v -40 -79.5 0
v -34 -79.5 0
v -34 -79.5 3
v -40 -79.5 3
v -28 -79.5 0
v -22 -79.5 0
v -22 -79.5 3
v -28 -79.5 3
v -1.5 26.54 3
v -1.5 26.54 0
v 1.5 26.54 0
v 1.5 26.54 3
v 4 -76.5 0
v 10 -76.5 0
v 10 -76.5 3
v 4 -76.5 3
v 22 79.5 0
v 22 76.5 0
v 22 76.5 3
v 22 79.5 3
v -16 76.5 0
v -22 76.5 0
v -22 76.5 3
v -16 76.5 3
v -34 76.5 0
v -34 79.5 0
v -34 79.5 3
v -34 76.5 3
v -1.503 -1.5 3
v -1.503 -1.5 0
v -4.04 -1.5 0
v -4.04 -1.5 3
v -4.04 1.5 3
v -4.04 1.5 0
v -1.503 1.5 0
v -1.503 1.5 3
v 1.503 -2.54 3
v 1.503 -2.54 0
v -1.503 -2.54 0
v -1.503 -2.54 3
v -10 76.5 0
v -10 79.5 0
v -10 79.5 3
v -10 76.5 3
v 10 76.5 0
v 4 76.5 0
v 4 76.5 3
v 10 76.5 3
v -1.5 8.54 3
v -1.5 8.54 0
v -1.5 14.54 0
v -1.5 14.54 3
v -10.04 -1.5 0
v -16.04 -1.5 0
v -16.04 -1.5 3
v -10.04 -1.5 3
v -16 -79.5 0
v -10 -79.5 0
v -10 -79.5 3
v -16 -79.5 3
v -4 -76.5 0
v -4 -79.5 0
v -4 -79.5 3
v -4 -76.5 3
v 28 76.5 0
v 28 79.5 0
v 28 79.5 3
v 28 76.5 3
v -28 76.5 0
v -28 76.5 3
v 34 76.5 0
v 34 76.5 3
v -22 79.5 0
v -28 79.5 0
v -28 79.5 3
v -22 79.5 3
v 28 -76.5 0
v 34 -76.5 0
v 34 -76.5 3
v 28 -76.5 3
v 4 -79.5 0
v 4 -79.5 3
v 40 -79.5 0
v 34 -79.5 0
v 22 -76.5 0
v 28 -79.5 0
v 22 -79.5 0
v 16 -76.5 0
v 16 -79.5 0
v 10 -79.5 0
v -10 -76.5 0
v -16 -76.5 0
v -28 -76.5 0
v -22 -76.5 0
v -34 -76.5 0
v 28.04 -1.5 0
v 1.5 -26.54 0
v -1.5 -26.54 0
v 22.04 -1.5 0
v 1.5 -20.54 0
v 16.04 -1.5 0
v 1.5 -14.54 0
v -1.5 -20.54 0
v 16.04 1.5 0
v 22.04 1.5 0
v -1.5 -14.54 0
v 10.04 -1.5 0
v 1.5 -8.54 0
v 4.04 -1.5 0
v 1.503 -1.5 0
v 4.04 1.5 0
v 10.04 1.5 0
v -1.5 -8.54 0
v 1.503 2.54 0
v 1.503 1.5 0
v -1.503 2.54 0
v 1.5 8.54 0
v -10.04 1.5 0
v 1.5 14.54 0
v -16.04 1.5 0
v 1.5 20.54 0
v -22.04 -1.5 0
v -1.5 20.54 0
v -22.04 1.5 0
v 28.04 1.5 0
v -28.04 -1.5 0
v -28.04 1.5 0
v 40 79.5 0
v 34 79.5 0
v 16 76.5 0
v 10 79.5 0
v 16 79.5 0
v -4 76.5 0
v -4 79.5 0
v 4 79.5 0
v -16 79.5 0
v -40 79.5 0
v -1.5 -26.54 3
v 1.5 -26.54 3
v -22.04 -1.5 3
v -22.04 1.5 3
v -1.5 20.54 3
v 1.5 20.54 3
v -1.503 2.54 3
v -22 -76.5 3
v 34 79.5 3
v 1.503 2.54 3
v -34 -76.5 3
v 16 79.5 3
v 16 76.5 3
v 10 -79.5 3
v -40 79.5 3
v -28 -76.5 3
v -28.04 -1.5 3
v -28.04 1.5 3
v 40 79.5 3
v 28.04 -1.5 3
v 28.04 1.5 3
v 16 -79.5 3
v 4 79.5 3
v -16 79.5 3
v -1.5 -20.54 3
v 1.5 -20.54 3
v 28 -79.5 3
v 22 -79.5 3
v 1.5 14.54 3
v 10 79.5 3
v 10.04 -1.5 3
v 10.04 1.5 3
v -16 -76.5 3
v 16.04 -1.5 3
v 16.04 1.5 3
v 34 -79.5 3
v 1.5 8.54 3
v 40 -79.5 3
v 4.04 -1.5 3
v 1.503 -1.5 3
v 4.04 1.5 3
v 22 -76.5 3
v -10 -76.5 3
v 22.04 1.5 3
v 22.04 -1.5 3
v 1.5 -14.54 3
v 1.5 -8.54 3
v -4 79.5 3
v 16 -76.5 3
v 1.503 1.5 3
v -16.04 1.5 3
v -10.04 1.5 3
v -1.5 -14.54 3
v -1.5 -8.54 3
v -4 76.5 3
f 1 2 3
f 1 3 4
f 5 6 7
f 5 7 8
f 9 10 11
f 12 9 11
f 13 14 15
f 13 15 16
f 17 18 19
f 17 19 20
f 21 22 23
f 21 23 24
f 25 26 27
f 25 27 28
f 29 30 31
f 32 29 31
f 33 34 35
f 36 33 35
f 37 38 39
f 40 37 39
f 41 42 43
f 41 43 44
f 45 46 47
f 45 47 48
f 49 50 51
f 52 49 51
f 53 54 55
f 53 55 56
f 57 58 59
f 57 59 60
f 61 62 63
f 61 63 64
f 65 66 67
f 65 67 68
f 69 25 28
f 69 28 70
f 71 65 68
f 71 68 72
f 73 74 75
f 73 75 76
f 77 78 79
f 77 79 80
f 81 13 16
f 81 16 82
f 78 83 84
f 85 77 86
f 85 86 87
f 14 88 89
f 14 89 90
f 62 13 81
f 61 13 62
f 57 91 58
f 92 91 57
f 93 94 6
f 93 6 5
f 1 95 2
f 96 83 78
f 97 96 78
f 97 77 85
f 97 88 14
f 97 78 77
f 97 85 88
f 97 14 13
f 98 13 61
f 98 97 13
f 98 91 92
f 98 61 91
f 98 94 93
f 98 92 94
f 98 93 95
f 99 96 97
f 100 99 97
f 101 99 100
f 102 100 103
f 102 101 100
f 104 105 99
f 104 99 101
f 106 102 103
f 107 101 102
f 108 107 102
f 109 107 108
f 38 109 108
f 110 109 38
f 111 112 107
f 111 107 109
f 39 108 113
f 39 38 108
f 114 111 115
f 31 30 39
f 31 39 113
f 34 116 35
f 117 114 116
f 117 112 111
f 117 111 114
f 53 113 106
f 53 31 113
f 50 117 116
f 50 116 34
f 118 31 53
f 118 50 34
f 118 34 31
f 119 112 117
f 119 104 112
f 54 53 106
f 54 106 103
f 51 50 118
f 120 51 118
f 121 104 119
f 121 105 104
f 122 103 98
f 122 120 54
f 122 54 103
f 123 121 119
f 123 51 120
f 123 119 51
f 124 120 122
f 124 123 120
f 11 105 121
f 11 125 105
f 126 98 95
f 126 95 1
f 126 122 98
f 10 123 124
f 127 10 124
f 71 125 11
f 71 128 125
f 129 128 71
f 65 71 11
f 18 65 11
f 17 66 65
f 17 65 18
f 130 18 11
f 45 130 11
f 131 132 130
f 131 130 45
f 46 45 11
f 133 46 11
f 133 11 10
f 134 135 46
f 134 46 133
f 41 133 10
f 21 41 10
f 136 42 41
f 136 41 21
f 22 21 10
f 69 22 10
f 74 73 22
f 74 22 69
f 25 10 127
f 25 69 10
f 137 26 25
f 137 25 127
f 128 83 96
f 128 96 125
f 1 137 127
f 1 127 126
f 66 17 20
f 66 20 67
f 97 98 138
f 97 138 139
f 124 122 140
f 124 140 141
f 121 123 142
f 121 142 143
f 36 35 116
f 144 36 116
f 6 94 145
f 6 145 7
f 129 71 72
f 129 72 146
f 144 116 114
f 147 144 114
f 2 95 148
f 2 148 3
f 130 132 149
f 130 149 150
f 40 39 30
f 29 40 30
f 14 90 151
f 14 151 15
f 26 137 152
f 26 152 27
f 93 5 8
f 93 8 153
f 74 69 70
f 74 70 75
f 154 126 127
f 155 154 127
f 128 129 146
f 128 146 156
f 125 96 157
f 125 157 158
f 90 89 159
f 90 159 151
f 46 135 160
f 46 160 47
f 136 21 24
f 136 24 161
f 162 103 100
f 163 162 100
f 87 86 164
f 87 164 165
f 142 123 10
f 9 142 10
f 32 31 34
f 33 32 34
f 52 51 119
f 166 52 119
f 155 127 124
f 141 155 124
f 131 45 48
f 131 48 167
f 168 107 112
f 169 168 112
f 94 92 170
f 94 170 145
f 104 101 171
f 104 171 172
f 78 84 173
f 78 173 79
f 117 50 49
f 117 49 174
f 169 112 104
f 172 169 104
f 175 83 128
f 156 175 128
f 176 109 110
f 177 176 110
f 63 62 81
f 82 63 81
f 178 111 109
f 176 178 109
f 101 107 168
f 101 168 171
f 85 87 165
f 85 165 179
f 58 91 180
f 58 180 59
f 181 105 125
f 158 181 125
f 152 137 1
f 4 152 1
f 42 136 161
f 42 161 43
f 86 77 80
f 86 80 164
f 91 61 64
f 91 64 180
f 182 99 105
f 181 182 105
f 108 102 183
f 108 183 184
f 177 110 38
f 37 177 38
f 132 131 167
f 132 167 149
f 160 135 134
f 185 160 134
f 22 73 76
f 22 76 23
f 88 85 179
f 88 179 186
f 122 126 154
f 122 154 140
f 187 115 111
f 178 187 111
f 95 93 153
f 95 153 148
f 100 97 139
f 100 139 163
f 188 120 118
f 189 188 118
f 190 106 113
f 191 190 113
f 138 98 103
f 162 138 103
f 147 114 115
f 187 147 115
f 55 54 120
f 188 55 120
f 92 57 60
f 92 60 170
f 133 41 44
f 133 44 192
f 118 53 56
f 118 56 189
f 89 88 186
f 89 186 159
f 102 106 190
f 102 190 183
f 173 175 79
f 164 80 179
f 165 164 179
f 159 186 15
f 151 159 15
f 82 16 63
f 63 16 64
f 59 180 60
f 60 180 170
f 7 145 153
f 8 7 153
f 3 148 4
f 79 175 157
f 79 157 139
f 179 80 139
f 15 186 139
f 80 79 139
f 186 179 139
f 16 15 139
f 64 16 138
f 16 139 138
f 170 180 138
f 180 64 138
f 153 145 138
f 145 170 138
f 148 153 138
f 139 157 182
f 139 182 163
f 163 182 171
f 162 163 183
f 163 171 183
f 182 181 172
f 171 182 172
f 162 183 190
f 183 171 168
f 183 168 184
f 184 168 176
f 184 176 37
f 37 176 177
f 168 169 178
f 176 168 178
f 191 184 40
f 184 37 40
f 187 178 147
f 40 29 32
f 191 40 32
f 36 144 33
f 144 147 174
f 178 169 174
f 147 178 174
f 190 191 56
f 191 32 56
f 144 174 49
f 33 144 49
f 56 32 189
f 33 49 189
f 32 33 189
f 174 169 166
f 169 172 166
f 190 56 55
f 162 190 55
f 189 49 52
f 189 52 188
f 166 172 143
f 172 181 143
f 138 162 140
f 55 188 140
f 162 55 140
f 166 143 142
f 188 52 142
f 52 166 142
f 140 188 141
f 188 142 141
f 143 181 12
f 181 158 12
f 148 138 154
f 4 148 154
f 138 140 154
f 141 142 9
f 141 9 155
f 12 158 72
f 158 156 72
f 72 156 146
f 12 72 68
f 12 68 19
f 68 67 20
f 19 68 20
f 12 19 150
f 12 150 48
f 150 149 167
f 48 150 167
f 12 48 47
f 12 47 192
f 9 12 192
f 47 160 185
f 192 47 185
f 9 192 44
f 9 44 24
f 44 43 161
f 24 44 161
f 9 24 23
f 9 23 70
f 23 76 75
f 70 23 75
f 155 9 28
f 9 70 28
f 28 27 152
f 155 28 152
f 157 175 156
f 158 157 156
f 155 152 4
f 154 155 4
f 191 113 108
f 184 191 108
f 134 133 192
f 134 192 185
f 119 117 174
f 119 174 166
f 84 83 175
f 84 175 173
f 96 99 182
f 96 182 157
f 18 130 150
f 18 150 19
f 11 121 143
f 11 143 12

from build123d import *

# Parameters (mm, degrees)
SKETCH1_W           = 6
SKETCH1_H           = 3
SKETCH1_W_2         = 3
SKETCH1_H_2         = 6
BOSS_EXTRUDE1_DEPTH = 3


with BuildPart() as part:
    # Sketch1 → Boss-Extrude1 (new body)
    with BuildSketch(Plane.XY):
        Polygon((-34, 76.5), (-28, 76.5), (-28, 79.5), (-22, 79.5), (-22, 76.5), (-16, 76.5), (-16, 79.5), (-10, 79.5), (-10, 76.5), (-4, 76.5), (-4, 79.5), (0, 79.5), (4, 79.5), (4, 76.5), (10, 76.5), (10, 79.5), (16, 79.5), (16, 76.5), (22, 76.5), (22, 79.5), (28, 79.5), (28, 76.5), (34, 76.5), (34, 79.5), (40, 79.5), (40, 76.5), (40, -76.5), (40, -79.5), (34, -79.5), (34, -76.5), (28, -76.5), (28, -79.5), (22, -79.5), (22, -76.5), (16, -76.5), (16, -79.5), (10, -79.5), (10, -76.5), (4, -76.5), (4, -79.5), (0, -79.5), (-4, -79.5), (-4, -76.5), (-10, -76.5), (-10, -79.5), (-16, -79.5), (-16, -76.5), (-22, -76.5), (-22, -79.5), (-28, -79.5), (-28, -76.5), (-34, -76.5), (-34, -79.5), (-40, -79.5), (-40, -76.5), (-40, 76.5), (-40, 79.5), (-34, 79.5), align=None)
        Polygon((-1.503424482, 2.54), (1.503424482, 2.54), (1.503424482, 1.5), (4.04, 1.5), (4.04, -1.5), (1.503424482, -1.5), (1.503424482, -2.54), (-1.503424482, -2.54), (-1.503424482, -1.5), (-4.04, -1.5), (-4.04, 1.5), (-1.503424482, 1.5), align=None, mode=Mode.SUBTRACT)
        with Locations((25.04, 0)):
            Rectangle(SKETCH1_W, SKETCH1_H, mode=Mode.SUBTRACT)
        with Locations((-13.04, 0)):
            Rectangle(SKETCH1_W, SKETCH1_H, mode=Mode.SUBTRACT)
        with Locations((-25.04, 0)):
            Rectangle(SKETCH1_W, SKETCH1_H, mode=Mode.SUBTRACT)
        with Locations((13.04, 0)):
            Rectangle(SKETCH1_W, SKETCH1_H, mode=Mode.SUBTRACT)
        with Locations((0, -23.54)):
            Rectangle(SKETCH1_W_2, SKETCH1_H_2, mode=Mode.SUBTRACT)
        with Locations((0, 11.54)):
            Rectangle(SKETCH1_W_2, SKETCH1_H_2, mode=Mode.SUBTRACT)
        with Locations((0, 23.54)):
            Rectangle(SKETCH1_W_2, SKETCH1_H_2, mode=Mode.SUBTRACT)
        with Locations((0, -11.54)):
            Rectangle(SKETCH1_W_2, SKETCH1_H_2, mode=Mode.SUBTRACT)
    extrude(amount=BOSS_EXTRUDE1_DEPTH)


solid = part.part
